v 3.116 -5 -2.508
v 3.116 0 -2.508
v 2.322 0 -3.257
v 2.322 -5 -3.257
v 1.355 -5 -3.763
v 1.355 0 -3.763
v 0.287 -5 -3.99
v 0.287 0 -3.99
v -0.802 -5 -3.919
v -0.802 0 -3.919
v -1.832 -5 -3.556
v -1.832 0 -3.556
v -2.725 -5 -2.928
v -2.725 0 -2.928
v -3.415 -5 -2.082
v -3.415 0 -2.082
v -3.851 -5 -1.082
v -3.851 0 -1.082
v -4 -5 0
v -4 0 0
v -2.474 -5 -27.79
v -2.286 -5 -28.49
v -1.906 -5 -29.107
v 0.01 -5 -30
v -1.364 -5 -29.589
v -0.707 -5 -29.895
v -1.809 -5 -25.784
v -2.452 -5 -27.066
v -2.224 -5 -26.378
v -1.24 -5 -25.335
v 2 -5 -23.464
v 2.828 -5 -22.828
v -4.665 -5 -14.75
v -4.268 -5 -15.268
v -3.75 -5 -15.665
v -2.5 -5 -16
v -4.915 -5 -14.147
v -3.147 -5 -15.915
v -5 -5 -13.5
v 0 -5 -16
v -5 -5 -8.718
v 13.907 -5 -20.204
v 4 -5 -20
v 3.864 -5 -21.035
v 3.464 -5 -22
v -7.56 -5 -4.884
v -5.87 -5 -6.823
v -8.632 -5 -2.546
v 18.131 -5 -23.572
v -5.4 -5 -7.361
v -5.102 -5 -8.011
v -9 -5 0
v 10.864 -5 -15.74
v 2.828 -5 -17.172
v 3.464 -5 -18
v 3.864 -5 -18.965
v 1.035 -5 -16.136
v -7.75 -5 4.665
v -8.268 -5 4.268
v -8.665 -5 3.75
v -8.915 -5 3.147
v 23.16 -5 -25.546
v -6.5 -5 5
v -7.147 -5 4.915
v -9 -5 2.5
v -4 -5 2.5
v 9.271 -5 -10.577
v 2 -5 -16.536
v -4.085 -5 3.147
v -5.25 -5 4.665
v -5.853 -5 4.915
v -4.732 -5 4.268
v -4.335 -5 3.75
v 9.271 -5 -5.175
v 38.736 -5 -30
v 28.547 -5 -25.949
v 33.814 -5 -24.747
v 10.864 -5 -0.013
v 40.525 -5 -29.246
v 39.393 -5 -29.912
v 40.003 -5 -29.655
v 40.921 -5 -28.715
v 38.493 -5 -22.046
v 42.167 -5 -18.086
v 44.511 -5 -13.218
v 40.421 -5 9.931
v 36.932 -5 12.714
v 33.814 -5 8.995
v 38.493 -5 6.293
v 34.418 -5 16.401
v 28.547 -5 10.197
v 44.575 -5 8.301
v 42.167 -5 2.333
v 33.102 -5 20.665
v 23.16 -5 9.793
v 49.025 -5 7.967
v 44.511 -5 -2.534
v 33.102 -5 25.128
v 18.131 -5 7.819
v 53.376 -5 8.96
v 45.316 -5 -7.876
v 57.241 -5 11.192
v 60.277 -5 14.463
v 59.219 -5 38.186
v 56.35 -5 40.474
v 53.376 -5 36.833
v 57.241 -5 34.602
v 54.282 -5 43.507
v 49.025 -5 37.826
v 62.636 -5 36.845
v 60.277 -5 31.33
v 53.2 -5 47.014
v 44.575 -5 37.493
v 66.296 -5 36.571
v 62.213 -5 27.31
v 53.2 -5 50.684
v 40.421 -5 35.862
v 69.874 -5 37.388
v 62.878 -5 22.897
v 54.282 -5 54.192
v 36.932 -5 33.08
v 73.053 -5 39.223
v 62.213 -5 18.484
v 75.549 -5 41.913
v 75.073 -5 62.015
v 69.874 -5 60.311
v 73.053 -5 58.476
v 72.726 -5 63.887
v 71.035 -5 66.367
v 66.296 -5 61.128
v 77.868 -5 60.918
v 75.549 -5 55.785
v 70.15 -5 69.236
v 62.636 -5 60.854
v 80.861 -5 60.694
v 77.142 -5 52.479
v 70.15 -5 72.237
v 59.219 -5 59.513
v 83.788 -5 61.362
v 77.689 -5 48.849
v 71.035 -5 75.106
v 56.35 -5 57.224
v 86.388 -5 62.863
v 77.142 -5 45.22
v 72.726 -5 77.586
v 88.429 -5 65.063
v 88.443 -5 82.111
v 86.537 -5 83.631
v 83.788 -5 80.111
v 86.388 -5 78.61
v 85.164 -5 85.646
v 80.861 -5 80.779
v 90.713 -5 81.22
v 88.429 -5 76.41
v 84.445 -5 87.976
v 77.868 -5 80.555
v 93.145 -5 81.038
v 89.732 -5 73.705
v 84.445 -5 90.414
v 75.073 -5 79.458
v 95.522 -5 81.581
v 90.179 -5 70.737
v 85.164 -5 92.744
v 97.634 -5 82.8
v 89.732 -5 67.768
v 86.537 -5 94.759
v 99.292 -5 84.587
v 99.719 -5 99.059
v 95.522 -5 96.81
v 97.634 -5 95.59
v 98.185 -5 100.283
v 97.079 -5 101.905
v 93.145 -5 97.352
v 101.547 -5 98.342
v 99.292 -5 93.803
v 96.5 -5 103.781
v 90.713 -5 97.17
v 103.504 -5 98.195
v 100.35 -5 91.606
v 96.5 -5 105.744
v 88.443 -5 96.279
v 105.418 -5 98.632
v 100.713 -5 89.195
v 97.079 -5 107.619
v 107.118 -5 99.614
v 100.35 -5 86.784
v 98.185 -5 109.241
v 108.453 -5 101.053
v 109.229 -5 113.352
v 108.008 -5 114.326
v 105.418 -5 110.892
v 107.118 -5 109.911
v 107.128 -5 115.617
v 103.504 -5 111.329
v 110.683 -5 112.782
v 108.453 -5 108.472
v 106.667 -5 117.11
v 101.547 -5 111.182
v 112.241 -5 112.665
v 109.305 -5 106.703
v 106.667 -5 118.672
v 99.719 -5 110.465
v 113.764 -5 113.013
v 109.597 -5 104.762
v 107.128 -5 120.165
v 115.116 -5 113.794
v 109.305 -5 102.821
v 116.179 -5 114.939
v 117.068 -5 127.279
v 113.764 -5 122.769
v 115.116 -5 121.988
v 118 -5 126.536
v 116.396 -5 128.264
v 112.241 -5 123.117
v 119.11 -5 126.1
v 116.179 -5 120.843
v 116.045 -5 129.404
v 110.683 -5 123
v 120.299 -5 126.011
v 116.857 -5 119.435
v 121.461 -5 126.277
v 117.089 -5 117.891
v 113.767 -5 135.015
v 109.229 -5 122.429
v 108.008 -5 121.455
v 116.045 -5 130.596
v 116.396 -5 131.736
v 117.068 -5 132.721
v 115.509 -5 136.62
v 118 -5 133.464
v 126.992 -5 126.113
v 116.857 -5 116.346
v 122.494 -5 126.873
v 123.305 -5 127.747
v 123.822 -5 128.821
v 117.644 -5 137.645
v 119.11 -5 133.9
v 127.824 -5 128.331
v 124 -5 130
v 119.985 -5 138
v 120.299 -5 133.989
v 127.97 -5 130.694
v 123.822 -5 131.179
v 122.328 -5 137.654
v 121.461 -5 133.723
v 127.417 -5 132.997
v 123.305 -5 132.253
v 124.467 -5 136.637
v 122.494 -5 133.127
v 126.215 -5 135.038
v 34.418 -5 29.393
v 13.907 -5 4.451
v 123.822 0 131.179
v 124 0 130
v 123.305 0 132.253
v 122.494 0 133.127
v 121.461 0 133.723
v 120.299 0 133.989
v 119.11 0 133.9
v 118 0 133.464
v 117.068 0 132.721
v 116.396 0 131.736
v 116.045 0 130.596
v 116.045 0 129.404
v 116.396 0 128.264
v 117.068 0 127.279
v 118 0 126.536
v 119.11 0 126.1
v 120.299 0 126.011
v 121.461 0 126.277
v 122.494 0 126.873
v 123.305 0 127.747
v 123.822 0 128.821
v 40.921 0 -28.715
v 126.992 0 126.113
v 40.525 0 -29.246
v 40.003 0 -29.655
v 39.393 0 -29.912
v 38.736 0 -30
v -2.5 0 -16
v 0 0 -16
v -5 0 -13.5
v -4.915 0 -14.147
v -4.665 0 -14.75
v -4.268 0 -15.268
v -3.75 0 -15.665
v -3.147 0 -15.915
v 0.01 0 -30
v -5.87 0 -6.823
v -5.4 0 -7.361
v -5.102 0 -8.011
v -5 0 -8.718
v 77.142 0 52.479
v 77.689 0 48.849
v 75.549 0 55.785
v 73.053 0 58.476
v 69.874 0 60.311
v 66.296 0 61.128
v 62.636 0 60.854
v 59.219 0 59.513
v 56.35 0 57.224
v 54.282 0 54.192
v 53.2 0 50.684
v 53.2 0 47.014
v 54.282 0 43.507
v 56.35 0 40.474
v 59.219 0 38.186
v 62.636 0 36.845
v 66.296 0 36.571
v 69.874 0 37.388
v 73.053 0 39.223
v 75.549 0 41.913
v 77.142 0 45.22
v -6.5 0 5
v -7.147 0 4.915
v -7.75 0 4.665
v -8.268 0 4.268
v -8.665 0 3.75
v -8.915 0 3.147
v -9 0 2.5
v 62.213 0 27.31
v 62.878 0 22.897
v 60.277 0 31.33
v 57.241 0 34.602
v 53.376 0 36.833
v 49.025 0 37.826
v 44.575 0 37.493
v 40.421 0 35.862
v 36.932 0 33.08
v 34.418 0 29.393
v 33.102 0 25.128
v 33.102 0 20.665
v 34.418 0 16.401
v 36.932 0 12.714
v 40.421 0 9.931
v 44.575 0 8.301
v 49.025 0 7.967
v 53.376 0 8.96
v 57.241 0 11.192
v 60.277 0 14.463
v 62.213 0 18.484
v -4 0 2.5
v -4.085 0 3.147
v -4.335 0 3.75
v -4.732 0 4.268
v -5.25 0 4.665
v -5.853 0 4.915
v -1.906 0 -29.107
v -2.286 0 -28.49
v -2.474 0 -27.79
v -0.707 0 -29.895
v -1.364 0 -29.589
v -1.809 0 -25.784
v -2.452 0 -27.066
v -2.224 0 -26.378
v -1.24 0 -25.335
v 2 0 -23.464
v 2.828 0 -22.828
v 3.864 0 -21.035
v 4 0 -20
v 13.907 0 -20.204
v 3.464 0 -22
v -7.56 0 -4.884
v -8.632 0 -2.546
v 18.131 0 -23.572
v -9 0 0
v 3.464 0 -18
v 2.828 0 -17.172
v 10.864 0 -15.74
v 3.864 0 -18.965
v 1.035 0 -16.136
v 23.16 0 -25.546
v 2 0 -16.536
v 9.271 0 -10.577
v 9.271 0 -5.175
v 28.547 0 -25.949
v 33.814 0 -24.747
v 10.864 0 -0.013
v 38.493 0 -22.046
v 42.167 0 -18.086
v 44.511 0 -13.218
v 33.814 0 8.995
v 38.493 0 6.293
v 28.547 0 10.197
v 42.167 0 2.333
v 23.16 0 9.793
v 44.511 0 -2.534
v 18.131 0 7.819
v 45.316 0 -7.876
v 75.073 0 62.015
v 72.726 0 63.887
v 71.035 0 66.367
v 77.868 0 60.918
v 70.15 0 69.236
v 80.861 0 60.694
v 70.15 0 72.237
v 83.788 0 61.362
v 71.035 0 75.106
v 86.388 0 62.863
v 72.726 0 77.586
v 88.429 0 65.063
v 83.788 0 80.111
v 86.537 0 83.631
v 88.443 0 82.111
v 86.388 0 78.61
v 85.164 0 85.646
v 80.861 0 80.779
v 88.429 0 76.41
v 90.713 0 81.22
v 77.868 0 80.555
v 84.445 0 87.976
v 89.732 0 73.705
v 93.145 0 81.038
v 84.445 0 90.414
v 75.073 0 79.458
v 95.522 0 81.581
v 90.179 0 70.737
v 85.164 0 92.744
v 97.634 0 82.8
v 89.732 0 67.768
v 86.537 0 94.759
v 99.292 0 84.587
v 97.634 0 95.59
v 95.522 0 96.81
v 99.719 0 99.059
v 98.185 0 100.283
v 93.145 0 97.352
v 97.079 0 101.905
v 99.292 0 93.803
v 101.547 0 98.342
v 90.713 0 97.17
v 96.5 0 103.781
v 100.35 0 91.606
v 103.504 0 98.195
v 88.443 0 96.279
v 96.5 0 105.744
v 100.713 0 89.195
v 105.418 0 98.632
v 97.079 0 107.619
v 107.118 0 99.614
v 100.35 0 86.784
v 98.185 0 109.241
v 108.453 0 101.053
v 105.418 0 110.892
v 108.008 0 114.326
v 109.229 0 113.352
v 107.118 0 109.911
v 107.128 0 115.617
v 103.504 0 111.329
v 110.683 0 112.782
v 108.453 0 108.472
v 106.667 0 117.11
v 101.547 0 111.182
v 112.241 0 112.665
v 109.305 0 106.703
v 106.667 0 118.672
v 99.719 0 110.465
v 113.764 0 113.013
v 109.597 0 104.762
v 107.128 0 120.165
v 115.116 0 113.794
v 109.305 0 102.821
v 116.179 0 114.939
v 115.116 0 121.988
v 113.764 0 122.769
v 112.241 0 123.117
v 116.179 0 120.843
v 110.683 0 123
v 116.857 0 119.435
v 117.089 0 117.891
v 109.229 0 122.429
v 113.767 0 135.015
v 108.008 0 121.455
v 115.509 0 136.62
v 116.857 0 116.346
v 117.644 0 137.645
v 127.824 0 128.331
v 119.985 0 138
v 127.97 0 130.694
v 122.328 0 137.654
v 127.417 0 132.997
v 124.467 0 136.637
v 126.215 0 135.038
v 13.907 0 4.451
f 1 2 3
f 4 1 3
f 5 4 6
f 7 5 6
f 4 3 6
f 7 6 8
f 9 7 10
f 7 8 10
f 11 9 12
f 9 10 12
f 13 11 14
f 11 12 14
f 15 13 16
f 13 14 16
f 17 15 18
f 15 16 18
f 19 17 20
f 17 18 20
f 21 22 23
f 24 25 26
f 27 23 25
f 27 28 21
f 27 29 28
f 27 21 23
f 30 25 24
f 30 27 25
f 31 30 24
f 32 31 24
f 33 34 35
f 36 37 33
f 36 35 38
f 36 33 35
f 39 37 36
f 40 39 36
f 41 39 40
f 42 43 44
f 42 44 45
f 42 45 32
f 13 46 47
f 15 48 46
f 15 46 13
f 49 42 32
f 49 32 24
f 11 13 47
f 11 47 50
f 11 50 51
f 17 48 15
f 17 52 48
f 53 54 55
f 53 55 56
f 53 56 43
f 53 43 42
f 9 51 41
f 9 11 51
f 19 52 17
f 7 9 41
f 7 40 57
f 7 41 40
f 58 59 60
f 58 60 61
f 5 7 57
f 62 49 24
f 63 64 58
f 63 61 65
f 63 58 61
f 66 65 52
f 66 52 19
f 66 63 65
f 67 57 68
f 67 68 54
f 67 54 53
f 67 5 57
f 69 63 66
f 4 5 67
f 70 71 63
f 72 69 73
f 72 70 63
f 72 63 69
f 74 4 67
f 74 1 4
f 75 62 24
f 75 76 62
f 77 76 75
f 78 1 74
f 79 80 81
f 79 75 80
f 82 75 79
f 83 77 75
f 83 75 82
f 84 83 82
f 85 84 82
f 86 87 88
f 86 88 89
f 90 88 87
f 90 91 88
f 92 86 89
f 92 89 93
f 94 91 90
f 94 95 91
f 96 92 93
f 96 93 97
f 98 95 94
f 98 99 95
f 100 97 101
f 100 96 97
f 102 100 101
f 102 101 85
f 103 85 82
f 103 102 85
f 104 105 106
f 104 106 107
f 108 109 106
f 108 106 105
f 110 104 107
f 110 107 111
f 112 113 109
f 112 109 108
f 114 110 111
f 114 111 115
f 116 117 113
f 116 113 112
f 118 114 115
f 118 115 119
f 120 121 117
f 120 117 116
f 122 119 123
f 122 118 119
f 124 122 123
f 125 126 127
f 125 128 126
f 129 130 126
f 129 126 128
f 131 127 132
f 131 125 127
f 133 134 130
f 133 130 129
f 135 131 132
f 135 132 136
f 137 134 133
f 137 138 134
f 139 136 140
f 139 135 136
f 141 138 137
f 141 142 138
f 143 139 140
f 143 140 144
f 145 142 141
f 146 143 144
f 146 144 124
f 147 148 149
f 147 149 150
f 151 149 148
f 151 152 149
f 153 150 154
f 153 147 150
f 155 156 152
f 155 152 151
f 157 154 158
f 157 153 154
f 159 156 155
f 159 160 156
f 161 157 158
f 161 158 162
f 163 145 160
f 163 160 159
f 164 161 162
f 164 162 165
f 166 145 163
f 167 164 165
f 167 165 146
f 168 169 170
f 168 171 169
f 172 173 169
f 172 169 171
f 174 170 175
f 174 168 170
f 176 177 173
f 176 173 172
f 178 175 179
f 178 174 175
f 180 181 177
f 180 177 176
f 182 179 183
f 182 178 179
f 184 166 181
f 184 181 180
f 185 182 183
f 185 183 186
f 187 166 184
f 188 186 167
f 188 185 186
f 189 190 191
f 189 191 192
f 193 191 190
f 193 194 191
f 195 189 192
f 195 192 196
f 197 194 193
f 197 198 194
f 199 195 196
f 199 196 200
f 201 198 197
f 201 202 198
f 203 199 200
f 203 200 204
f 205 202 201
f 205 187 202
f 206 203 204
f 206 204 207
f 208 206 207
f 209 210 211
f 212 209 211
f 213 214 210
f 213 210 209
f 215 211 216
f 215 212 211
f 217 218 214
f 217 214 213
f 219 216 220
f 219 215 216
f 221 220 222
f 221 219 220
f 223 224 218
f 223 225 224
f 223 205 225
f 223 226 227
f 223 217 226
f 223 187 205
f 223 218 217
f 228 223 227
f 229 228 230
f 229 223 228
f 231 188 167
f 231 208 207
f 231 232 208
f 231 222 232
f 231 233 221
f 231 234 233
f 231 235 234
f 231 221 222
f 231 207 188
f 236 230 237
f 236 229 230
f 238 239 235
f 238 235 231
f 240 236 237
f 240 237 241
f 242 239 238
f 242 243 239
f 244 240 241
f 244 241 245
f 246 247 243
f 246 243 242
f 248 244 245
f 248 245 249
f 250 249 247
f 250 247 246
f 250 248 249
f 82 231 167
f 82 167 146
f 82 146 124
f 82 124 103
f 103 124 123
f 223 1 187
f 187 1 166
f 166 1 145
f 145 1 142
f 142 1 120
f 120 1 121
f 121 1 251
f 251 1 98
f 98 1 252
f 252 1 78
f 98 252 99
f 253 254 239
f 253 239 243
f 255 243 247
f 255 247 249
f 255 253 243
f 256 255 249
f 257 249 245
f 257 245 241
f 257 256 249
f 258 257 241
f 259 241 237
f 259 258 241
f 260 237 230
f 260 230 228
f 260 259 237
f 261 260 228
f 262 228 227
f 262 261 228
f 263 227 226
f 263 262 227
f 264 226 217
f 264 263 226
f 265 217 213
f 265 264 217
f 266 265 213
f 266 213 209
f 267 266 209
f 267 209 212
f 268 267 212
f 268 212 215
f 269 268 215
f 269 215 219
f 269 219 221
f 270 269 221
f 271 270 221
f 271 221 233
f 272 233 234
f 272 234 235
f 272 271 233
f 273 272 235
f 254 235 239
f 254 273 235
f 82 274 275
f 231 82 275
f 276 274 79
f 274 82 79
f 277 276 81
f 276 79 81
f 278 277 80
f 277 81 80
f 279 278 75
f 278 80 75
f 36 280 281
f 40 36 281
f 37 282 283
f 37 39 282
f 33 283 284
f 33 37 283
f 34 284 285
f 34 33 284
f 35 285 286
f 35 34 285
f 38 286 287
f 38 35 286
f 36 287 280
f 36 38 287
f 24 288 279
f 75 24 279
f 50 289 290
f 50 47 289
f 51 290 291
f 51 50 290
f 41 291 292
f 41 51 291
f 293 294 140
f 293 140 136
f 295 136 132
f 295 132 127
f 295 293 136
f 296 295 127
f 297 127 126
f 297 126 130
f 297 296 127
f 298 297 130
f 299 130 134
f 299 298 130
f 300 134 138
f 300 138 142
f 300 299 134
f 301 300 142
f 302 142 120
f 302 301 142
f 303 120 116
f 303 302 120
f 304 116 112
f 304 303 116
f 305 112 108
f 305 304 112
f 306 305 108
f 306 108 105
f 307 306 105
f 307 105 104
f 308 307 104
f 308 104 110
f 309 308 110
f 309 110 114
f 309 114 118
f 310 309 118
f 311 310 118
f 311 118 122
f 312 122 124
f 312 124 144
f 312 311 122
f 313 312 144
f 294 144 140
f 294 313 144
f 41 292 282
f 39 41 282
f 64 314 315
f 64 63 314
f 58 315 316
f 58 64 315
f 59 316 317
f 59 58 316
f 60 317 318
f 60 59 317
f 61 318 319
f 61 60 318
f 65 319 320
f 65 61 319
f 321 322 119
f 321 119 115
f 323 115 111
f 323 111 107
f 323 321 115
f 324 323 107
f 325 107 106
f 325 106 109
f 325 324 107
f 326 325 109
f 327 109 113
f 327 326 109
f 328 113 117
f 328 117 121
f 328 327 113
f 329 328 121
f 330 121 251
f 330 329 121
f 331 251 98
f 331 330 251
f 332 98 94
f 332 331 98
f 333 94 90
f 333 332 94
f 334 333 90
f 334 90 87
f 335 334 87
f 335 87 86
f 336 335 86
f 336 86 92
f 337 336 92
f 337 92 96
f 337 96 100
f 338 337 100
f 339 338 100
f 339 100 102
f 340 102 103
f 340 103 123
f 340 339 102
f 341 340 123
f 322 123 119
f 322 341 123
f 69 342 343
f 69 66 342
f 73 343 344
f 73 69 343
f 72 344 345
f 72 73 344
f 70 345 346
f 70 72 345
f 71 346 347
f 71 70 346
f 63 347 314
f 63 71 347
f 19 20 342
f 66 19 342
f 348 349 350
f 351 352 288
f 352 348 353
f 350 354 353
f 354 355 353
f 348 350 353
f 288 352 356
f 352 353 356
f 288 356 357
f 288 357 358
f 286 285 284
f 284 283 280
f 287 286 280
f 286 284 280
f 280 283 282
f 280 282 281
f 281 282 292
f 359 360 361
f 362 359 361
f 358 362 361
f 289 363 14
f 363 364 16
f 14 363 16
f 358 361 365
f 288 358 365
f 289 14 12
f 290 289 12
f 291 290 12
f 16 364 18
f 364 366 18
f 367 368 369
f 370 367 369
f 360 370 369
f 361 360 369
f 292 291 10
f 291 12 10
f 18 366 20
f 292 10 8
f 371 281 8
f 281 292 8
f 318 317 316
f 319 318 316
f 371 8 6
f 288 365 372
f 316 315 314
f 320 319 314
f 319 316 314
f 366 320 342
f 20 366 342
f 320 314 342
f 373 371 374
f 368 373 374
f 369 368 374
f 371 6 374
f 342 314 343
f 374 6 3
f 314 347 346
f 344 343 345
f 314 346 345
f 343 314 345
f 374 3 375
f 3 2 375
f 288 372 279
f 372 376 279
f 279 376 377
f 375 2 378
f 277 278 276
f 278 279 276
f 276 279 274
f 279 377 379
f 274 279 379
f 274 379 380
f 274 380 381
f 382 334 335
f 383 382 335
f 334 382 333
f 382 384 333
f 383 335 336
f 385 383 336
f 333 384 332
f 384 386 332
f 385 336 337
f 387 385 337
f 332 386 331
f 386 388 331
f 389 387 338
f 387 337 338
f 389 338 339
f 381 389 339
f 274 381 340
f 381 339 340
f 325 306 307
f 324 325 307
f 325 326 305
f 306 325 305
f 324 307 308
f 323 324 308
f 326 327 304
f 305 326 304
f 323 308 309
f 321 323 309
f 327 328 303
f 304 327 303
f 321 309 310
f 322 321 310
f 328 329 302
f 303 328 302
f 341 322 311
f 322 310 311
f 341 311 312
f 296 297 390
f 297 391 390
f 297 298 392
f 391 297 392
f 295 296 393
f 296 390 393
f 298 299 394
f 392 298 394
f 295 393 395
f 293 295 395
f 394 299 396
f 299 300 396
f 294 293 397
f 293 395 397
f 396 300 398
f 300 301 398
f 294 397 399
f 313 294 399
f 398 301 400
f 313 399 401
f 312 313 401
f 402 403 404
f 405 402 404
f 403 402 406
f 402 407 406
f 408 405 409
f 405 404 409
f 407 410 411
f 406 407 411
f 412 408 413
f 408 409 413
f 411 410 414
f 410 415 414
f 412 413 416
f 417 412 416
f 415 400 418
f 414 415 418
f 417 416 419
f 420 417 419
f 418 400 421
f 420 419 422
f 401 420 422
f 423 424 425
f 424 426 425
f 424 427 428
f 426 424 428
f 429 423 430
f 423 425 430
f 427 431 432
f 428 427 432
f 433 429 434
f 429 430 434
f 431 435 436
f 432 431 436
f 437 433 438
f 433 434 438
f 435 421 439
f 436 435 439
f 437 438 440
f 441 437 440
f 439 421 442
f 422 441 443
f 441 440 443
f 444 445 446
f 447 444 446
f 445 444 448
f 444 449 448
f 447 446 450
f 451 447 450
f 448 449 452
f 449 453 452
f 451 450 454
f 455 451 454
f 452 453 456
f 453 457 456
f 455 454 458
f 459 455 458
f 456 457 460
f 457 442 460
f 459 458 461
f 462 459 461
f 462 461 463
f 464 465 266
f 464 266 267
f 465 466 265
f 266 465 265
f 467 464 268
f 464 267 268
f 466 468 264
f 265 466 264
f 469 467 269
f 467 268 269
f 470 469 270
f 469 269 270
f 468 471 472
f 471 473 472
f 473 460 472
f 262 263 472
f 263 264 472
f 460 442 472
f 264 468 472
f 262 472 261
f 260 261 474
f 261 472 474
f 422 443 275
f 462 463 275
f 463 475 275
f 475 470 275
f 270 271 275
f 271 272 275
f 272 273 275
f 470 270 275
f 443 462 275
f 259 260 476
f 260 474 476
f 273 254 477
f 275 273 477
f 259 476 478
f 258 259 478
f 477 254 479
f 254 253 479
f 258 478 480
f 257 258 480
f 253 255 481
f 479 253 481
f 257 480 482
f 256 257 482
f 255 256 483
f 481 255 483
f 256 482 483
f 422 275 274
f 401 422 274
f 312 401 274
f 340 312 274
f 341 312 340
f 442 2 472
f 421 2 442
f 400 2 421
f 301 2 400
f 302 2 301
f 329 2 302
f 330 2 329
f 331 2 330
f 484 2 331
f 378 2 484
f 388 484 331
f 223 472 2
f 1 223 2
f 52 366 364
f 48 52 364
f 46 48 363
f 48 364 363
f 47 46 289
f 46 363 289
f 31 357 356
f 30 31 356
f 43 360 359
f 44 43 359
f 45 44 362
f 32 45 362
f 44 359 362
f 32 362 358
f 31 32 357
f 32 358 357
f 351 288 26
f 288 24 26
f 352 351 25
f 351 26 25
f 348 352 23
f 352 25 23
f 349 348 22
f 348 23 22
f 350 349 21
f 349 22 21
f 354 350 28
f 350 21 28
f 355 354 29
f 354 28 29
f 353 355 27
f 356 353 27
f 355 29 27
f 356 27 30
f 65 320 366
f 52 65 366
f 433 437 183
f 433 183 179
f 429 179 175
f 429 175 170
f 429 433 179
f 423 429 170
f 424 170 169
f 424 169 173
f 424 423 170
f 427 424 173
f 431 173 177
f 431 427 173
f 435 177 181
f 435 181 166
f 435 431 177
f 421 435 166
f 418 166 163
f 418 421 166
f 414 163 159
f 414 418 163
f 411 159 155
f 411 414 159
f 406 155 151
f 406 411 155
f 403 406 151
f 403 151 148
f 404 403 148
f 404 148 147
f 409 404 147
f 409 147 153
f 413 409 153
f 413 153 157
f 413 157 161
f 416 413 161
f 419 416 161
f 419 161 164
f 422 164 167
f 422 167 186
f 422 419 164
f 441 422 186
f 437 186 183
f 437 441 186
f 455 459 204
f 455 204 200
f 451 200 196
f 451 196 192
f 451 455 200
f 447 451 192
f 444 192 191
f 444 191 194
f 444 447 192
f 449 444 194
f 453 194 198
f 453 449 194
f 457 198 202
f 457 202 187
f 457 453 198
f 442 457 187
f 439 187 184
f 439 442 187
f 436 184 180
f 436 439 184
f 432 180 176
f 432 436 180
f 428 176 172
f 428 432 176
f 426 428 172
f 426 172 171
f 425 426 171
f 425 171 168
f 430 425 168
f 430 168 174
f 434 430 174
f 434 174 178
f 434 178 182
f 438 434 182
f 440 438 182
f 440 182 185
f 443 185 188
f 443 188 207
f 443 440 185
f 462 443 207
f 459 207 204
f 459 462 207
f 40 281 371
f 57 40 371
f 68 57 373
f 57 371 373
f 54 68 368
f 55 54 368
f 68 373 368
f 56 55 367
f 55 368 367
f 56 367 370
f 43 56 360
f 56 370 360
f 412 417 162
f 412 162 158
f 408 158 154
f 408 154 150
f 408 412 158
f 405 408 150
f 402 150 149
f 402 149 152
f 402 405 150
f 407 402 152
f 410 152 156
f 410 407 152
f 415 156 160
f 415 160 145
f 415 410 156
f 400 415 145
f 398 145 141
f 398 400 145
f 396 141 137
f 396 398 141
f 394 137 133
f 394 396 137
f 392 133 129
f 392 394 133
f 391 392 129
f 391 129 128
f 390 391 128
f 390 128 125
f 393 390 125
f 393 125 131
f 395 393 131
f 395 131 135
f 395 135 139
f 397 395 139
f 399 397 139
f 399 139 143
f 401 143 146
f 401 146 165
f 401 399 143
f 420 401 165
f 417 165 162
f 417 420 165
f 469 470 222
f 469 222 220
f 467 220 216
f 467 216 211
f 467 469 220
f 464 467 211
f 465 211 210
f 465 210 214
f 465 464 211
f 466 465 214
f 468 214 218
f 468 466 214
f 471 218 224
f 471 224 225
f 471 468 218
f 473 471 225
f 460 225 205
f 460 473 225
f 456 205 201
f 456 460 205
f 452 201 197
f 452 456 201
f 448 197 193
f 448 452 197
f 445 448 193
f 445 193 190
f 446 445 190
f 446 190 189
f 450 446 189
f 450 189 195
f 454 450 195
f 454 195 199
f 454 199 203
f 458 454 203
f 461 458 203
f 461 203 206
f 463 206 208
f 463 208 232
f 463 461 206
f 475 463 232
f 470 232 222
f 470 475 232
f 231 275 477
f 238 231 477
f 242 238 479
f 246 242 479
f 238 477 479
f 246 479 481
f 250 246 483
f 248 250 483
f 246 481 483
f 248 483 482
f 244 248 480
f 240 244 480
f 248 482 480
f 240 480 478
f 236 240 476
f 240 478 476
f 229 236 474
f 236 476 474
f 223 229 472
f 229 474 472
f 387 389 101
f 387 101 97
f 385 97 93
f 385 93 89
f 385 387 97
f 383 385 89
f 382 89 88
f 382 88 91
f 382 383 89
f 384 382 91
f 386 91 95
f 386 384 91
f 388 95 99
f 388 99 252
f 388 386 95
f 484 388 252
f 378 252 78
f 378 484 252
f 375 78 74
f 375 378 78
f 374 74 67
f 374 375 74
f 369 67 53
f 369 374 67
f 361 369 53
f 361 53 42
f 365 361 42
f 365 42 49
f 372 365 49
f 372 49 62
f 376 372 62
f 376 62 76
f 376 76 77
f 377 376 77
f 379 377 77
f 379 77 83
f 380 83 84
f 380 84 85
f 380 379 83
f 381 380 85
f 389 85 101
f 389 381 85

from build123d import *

# Parameters (mm, degrees)
F0_R     = 18.1237353156
F0_R_2   = 14.9714122035
F0_R_3   = 12.3128911041
F0_R_4   = 10.0708194052
F0_R_5   = 8.1799615502
F0_R_6   = 6.5853009382
F0_R_7   = 5.2404391544
F0_R_8   = 4
F1_DEPTH = 5
F2_R     = 2.49999


# Not quite as in the source:
# - a fillet or chamfer is up to 0.001 mm smaller than in the source, because OpenCascade refuses the exact size


with BuildPart() as f1:
    # F0 (on Front) → F1 (new body)
    with BuildSketch(Plane.XZ):
        with BuildLine():
            ThreePointArc((3.1164704126, -2.5075111501), (-1.3293077803, -3.7726569981), (-4, 0))
            Line((-4, 0), (-4, 5))
            Line((-4, 5), (-9, 5))
            Line((-9, 5), (-9, 0))
            ThreePointArc((-9, 0), (-7.9372539332, -4.2426406871), (-5, -7.4833147735))
            Line((-5, -7.4833147735), (-5, -16))
            Line((-5, -16), (0, -16))
            ThreePointArc((0, -16), (2.8284271247, -17.1715728753), (4, -20))
            ThreePointArc((4, -20), (3.4641016151, -22), (2, -23.4641016151))
            Line((2, -23.4641016151), (-9.3205080757, -30))
            Line((-9.3205080757, -30), (40.2062176005, -30))
            Line((40.2062176005, -30), (126.9921824081, 126.1129207402))
            ThreePointArc((126.9921824081, 126.1129207402), (124.4672099784, 136.6365680143), (113.7670591749, 135.0150223001))
            Line((113.7670591749, 135.0150223001), (3.1164704126, -2.5075111501))
        make_face()
        with Locations((27.1926598128, -7.8762646844)):
            Circle(F0_R, mode=Mode.SUBTRACT)
        with Locations((47.9066364562, 22.8967940046)):
            Circle(F0_R_2, mode=Mode.SUBTRACT)
        with Locations((65.375830444, 48.8493448398)):
            Circle(F0_R_3, mode=Mode.SUBTRACT)
        with Locations((80.1085273008, 70.736505998)):
            Circle(F0_R_4, mode=Mode.SUBTRACT)
        with Locations((92.5333911397, 89.1951086458)):
            Circle(F0_R_5, mode=Mode.SUBTRACT)
        with Locations((103.0119371191, 104.7622262472)):
            Circle(F0_R_6, mode=Mode.SUBTRACT)
        with Locations((111.8490501262, 117.8908013099)):
            Circle(F0_R_7, mode=Mode.SUBTRACT)
        with Locations((120, 130)):
            Circle(F0_R_8, mode=Mode.SUBTRACT)
    extrude(amount=F1_DEPTH)

    # F2 (radius 2.5 in the source; OpenCascade refuses exactly that, so slightly less here)
    f2_edges = [f1.edges().sort_by_distance(p)[0] for p in [
        (-9, -2.5, 5),
        (-4, -2.5, 5),
        (-9.320508, -2.5, -30),
        (40.206218, -2.5, -30),
        (-5, -2.5, -7.483315),
        (-5, -2.5, -16),
    ]]
    fillet(f2_edges, radius=F2_R)


solid = f1.part
